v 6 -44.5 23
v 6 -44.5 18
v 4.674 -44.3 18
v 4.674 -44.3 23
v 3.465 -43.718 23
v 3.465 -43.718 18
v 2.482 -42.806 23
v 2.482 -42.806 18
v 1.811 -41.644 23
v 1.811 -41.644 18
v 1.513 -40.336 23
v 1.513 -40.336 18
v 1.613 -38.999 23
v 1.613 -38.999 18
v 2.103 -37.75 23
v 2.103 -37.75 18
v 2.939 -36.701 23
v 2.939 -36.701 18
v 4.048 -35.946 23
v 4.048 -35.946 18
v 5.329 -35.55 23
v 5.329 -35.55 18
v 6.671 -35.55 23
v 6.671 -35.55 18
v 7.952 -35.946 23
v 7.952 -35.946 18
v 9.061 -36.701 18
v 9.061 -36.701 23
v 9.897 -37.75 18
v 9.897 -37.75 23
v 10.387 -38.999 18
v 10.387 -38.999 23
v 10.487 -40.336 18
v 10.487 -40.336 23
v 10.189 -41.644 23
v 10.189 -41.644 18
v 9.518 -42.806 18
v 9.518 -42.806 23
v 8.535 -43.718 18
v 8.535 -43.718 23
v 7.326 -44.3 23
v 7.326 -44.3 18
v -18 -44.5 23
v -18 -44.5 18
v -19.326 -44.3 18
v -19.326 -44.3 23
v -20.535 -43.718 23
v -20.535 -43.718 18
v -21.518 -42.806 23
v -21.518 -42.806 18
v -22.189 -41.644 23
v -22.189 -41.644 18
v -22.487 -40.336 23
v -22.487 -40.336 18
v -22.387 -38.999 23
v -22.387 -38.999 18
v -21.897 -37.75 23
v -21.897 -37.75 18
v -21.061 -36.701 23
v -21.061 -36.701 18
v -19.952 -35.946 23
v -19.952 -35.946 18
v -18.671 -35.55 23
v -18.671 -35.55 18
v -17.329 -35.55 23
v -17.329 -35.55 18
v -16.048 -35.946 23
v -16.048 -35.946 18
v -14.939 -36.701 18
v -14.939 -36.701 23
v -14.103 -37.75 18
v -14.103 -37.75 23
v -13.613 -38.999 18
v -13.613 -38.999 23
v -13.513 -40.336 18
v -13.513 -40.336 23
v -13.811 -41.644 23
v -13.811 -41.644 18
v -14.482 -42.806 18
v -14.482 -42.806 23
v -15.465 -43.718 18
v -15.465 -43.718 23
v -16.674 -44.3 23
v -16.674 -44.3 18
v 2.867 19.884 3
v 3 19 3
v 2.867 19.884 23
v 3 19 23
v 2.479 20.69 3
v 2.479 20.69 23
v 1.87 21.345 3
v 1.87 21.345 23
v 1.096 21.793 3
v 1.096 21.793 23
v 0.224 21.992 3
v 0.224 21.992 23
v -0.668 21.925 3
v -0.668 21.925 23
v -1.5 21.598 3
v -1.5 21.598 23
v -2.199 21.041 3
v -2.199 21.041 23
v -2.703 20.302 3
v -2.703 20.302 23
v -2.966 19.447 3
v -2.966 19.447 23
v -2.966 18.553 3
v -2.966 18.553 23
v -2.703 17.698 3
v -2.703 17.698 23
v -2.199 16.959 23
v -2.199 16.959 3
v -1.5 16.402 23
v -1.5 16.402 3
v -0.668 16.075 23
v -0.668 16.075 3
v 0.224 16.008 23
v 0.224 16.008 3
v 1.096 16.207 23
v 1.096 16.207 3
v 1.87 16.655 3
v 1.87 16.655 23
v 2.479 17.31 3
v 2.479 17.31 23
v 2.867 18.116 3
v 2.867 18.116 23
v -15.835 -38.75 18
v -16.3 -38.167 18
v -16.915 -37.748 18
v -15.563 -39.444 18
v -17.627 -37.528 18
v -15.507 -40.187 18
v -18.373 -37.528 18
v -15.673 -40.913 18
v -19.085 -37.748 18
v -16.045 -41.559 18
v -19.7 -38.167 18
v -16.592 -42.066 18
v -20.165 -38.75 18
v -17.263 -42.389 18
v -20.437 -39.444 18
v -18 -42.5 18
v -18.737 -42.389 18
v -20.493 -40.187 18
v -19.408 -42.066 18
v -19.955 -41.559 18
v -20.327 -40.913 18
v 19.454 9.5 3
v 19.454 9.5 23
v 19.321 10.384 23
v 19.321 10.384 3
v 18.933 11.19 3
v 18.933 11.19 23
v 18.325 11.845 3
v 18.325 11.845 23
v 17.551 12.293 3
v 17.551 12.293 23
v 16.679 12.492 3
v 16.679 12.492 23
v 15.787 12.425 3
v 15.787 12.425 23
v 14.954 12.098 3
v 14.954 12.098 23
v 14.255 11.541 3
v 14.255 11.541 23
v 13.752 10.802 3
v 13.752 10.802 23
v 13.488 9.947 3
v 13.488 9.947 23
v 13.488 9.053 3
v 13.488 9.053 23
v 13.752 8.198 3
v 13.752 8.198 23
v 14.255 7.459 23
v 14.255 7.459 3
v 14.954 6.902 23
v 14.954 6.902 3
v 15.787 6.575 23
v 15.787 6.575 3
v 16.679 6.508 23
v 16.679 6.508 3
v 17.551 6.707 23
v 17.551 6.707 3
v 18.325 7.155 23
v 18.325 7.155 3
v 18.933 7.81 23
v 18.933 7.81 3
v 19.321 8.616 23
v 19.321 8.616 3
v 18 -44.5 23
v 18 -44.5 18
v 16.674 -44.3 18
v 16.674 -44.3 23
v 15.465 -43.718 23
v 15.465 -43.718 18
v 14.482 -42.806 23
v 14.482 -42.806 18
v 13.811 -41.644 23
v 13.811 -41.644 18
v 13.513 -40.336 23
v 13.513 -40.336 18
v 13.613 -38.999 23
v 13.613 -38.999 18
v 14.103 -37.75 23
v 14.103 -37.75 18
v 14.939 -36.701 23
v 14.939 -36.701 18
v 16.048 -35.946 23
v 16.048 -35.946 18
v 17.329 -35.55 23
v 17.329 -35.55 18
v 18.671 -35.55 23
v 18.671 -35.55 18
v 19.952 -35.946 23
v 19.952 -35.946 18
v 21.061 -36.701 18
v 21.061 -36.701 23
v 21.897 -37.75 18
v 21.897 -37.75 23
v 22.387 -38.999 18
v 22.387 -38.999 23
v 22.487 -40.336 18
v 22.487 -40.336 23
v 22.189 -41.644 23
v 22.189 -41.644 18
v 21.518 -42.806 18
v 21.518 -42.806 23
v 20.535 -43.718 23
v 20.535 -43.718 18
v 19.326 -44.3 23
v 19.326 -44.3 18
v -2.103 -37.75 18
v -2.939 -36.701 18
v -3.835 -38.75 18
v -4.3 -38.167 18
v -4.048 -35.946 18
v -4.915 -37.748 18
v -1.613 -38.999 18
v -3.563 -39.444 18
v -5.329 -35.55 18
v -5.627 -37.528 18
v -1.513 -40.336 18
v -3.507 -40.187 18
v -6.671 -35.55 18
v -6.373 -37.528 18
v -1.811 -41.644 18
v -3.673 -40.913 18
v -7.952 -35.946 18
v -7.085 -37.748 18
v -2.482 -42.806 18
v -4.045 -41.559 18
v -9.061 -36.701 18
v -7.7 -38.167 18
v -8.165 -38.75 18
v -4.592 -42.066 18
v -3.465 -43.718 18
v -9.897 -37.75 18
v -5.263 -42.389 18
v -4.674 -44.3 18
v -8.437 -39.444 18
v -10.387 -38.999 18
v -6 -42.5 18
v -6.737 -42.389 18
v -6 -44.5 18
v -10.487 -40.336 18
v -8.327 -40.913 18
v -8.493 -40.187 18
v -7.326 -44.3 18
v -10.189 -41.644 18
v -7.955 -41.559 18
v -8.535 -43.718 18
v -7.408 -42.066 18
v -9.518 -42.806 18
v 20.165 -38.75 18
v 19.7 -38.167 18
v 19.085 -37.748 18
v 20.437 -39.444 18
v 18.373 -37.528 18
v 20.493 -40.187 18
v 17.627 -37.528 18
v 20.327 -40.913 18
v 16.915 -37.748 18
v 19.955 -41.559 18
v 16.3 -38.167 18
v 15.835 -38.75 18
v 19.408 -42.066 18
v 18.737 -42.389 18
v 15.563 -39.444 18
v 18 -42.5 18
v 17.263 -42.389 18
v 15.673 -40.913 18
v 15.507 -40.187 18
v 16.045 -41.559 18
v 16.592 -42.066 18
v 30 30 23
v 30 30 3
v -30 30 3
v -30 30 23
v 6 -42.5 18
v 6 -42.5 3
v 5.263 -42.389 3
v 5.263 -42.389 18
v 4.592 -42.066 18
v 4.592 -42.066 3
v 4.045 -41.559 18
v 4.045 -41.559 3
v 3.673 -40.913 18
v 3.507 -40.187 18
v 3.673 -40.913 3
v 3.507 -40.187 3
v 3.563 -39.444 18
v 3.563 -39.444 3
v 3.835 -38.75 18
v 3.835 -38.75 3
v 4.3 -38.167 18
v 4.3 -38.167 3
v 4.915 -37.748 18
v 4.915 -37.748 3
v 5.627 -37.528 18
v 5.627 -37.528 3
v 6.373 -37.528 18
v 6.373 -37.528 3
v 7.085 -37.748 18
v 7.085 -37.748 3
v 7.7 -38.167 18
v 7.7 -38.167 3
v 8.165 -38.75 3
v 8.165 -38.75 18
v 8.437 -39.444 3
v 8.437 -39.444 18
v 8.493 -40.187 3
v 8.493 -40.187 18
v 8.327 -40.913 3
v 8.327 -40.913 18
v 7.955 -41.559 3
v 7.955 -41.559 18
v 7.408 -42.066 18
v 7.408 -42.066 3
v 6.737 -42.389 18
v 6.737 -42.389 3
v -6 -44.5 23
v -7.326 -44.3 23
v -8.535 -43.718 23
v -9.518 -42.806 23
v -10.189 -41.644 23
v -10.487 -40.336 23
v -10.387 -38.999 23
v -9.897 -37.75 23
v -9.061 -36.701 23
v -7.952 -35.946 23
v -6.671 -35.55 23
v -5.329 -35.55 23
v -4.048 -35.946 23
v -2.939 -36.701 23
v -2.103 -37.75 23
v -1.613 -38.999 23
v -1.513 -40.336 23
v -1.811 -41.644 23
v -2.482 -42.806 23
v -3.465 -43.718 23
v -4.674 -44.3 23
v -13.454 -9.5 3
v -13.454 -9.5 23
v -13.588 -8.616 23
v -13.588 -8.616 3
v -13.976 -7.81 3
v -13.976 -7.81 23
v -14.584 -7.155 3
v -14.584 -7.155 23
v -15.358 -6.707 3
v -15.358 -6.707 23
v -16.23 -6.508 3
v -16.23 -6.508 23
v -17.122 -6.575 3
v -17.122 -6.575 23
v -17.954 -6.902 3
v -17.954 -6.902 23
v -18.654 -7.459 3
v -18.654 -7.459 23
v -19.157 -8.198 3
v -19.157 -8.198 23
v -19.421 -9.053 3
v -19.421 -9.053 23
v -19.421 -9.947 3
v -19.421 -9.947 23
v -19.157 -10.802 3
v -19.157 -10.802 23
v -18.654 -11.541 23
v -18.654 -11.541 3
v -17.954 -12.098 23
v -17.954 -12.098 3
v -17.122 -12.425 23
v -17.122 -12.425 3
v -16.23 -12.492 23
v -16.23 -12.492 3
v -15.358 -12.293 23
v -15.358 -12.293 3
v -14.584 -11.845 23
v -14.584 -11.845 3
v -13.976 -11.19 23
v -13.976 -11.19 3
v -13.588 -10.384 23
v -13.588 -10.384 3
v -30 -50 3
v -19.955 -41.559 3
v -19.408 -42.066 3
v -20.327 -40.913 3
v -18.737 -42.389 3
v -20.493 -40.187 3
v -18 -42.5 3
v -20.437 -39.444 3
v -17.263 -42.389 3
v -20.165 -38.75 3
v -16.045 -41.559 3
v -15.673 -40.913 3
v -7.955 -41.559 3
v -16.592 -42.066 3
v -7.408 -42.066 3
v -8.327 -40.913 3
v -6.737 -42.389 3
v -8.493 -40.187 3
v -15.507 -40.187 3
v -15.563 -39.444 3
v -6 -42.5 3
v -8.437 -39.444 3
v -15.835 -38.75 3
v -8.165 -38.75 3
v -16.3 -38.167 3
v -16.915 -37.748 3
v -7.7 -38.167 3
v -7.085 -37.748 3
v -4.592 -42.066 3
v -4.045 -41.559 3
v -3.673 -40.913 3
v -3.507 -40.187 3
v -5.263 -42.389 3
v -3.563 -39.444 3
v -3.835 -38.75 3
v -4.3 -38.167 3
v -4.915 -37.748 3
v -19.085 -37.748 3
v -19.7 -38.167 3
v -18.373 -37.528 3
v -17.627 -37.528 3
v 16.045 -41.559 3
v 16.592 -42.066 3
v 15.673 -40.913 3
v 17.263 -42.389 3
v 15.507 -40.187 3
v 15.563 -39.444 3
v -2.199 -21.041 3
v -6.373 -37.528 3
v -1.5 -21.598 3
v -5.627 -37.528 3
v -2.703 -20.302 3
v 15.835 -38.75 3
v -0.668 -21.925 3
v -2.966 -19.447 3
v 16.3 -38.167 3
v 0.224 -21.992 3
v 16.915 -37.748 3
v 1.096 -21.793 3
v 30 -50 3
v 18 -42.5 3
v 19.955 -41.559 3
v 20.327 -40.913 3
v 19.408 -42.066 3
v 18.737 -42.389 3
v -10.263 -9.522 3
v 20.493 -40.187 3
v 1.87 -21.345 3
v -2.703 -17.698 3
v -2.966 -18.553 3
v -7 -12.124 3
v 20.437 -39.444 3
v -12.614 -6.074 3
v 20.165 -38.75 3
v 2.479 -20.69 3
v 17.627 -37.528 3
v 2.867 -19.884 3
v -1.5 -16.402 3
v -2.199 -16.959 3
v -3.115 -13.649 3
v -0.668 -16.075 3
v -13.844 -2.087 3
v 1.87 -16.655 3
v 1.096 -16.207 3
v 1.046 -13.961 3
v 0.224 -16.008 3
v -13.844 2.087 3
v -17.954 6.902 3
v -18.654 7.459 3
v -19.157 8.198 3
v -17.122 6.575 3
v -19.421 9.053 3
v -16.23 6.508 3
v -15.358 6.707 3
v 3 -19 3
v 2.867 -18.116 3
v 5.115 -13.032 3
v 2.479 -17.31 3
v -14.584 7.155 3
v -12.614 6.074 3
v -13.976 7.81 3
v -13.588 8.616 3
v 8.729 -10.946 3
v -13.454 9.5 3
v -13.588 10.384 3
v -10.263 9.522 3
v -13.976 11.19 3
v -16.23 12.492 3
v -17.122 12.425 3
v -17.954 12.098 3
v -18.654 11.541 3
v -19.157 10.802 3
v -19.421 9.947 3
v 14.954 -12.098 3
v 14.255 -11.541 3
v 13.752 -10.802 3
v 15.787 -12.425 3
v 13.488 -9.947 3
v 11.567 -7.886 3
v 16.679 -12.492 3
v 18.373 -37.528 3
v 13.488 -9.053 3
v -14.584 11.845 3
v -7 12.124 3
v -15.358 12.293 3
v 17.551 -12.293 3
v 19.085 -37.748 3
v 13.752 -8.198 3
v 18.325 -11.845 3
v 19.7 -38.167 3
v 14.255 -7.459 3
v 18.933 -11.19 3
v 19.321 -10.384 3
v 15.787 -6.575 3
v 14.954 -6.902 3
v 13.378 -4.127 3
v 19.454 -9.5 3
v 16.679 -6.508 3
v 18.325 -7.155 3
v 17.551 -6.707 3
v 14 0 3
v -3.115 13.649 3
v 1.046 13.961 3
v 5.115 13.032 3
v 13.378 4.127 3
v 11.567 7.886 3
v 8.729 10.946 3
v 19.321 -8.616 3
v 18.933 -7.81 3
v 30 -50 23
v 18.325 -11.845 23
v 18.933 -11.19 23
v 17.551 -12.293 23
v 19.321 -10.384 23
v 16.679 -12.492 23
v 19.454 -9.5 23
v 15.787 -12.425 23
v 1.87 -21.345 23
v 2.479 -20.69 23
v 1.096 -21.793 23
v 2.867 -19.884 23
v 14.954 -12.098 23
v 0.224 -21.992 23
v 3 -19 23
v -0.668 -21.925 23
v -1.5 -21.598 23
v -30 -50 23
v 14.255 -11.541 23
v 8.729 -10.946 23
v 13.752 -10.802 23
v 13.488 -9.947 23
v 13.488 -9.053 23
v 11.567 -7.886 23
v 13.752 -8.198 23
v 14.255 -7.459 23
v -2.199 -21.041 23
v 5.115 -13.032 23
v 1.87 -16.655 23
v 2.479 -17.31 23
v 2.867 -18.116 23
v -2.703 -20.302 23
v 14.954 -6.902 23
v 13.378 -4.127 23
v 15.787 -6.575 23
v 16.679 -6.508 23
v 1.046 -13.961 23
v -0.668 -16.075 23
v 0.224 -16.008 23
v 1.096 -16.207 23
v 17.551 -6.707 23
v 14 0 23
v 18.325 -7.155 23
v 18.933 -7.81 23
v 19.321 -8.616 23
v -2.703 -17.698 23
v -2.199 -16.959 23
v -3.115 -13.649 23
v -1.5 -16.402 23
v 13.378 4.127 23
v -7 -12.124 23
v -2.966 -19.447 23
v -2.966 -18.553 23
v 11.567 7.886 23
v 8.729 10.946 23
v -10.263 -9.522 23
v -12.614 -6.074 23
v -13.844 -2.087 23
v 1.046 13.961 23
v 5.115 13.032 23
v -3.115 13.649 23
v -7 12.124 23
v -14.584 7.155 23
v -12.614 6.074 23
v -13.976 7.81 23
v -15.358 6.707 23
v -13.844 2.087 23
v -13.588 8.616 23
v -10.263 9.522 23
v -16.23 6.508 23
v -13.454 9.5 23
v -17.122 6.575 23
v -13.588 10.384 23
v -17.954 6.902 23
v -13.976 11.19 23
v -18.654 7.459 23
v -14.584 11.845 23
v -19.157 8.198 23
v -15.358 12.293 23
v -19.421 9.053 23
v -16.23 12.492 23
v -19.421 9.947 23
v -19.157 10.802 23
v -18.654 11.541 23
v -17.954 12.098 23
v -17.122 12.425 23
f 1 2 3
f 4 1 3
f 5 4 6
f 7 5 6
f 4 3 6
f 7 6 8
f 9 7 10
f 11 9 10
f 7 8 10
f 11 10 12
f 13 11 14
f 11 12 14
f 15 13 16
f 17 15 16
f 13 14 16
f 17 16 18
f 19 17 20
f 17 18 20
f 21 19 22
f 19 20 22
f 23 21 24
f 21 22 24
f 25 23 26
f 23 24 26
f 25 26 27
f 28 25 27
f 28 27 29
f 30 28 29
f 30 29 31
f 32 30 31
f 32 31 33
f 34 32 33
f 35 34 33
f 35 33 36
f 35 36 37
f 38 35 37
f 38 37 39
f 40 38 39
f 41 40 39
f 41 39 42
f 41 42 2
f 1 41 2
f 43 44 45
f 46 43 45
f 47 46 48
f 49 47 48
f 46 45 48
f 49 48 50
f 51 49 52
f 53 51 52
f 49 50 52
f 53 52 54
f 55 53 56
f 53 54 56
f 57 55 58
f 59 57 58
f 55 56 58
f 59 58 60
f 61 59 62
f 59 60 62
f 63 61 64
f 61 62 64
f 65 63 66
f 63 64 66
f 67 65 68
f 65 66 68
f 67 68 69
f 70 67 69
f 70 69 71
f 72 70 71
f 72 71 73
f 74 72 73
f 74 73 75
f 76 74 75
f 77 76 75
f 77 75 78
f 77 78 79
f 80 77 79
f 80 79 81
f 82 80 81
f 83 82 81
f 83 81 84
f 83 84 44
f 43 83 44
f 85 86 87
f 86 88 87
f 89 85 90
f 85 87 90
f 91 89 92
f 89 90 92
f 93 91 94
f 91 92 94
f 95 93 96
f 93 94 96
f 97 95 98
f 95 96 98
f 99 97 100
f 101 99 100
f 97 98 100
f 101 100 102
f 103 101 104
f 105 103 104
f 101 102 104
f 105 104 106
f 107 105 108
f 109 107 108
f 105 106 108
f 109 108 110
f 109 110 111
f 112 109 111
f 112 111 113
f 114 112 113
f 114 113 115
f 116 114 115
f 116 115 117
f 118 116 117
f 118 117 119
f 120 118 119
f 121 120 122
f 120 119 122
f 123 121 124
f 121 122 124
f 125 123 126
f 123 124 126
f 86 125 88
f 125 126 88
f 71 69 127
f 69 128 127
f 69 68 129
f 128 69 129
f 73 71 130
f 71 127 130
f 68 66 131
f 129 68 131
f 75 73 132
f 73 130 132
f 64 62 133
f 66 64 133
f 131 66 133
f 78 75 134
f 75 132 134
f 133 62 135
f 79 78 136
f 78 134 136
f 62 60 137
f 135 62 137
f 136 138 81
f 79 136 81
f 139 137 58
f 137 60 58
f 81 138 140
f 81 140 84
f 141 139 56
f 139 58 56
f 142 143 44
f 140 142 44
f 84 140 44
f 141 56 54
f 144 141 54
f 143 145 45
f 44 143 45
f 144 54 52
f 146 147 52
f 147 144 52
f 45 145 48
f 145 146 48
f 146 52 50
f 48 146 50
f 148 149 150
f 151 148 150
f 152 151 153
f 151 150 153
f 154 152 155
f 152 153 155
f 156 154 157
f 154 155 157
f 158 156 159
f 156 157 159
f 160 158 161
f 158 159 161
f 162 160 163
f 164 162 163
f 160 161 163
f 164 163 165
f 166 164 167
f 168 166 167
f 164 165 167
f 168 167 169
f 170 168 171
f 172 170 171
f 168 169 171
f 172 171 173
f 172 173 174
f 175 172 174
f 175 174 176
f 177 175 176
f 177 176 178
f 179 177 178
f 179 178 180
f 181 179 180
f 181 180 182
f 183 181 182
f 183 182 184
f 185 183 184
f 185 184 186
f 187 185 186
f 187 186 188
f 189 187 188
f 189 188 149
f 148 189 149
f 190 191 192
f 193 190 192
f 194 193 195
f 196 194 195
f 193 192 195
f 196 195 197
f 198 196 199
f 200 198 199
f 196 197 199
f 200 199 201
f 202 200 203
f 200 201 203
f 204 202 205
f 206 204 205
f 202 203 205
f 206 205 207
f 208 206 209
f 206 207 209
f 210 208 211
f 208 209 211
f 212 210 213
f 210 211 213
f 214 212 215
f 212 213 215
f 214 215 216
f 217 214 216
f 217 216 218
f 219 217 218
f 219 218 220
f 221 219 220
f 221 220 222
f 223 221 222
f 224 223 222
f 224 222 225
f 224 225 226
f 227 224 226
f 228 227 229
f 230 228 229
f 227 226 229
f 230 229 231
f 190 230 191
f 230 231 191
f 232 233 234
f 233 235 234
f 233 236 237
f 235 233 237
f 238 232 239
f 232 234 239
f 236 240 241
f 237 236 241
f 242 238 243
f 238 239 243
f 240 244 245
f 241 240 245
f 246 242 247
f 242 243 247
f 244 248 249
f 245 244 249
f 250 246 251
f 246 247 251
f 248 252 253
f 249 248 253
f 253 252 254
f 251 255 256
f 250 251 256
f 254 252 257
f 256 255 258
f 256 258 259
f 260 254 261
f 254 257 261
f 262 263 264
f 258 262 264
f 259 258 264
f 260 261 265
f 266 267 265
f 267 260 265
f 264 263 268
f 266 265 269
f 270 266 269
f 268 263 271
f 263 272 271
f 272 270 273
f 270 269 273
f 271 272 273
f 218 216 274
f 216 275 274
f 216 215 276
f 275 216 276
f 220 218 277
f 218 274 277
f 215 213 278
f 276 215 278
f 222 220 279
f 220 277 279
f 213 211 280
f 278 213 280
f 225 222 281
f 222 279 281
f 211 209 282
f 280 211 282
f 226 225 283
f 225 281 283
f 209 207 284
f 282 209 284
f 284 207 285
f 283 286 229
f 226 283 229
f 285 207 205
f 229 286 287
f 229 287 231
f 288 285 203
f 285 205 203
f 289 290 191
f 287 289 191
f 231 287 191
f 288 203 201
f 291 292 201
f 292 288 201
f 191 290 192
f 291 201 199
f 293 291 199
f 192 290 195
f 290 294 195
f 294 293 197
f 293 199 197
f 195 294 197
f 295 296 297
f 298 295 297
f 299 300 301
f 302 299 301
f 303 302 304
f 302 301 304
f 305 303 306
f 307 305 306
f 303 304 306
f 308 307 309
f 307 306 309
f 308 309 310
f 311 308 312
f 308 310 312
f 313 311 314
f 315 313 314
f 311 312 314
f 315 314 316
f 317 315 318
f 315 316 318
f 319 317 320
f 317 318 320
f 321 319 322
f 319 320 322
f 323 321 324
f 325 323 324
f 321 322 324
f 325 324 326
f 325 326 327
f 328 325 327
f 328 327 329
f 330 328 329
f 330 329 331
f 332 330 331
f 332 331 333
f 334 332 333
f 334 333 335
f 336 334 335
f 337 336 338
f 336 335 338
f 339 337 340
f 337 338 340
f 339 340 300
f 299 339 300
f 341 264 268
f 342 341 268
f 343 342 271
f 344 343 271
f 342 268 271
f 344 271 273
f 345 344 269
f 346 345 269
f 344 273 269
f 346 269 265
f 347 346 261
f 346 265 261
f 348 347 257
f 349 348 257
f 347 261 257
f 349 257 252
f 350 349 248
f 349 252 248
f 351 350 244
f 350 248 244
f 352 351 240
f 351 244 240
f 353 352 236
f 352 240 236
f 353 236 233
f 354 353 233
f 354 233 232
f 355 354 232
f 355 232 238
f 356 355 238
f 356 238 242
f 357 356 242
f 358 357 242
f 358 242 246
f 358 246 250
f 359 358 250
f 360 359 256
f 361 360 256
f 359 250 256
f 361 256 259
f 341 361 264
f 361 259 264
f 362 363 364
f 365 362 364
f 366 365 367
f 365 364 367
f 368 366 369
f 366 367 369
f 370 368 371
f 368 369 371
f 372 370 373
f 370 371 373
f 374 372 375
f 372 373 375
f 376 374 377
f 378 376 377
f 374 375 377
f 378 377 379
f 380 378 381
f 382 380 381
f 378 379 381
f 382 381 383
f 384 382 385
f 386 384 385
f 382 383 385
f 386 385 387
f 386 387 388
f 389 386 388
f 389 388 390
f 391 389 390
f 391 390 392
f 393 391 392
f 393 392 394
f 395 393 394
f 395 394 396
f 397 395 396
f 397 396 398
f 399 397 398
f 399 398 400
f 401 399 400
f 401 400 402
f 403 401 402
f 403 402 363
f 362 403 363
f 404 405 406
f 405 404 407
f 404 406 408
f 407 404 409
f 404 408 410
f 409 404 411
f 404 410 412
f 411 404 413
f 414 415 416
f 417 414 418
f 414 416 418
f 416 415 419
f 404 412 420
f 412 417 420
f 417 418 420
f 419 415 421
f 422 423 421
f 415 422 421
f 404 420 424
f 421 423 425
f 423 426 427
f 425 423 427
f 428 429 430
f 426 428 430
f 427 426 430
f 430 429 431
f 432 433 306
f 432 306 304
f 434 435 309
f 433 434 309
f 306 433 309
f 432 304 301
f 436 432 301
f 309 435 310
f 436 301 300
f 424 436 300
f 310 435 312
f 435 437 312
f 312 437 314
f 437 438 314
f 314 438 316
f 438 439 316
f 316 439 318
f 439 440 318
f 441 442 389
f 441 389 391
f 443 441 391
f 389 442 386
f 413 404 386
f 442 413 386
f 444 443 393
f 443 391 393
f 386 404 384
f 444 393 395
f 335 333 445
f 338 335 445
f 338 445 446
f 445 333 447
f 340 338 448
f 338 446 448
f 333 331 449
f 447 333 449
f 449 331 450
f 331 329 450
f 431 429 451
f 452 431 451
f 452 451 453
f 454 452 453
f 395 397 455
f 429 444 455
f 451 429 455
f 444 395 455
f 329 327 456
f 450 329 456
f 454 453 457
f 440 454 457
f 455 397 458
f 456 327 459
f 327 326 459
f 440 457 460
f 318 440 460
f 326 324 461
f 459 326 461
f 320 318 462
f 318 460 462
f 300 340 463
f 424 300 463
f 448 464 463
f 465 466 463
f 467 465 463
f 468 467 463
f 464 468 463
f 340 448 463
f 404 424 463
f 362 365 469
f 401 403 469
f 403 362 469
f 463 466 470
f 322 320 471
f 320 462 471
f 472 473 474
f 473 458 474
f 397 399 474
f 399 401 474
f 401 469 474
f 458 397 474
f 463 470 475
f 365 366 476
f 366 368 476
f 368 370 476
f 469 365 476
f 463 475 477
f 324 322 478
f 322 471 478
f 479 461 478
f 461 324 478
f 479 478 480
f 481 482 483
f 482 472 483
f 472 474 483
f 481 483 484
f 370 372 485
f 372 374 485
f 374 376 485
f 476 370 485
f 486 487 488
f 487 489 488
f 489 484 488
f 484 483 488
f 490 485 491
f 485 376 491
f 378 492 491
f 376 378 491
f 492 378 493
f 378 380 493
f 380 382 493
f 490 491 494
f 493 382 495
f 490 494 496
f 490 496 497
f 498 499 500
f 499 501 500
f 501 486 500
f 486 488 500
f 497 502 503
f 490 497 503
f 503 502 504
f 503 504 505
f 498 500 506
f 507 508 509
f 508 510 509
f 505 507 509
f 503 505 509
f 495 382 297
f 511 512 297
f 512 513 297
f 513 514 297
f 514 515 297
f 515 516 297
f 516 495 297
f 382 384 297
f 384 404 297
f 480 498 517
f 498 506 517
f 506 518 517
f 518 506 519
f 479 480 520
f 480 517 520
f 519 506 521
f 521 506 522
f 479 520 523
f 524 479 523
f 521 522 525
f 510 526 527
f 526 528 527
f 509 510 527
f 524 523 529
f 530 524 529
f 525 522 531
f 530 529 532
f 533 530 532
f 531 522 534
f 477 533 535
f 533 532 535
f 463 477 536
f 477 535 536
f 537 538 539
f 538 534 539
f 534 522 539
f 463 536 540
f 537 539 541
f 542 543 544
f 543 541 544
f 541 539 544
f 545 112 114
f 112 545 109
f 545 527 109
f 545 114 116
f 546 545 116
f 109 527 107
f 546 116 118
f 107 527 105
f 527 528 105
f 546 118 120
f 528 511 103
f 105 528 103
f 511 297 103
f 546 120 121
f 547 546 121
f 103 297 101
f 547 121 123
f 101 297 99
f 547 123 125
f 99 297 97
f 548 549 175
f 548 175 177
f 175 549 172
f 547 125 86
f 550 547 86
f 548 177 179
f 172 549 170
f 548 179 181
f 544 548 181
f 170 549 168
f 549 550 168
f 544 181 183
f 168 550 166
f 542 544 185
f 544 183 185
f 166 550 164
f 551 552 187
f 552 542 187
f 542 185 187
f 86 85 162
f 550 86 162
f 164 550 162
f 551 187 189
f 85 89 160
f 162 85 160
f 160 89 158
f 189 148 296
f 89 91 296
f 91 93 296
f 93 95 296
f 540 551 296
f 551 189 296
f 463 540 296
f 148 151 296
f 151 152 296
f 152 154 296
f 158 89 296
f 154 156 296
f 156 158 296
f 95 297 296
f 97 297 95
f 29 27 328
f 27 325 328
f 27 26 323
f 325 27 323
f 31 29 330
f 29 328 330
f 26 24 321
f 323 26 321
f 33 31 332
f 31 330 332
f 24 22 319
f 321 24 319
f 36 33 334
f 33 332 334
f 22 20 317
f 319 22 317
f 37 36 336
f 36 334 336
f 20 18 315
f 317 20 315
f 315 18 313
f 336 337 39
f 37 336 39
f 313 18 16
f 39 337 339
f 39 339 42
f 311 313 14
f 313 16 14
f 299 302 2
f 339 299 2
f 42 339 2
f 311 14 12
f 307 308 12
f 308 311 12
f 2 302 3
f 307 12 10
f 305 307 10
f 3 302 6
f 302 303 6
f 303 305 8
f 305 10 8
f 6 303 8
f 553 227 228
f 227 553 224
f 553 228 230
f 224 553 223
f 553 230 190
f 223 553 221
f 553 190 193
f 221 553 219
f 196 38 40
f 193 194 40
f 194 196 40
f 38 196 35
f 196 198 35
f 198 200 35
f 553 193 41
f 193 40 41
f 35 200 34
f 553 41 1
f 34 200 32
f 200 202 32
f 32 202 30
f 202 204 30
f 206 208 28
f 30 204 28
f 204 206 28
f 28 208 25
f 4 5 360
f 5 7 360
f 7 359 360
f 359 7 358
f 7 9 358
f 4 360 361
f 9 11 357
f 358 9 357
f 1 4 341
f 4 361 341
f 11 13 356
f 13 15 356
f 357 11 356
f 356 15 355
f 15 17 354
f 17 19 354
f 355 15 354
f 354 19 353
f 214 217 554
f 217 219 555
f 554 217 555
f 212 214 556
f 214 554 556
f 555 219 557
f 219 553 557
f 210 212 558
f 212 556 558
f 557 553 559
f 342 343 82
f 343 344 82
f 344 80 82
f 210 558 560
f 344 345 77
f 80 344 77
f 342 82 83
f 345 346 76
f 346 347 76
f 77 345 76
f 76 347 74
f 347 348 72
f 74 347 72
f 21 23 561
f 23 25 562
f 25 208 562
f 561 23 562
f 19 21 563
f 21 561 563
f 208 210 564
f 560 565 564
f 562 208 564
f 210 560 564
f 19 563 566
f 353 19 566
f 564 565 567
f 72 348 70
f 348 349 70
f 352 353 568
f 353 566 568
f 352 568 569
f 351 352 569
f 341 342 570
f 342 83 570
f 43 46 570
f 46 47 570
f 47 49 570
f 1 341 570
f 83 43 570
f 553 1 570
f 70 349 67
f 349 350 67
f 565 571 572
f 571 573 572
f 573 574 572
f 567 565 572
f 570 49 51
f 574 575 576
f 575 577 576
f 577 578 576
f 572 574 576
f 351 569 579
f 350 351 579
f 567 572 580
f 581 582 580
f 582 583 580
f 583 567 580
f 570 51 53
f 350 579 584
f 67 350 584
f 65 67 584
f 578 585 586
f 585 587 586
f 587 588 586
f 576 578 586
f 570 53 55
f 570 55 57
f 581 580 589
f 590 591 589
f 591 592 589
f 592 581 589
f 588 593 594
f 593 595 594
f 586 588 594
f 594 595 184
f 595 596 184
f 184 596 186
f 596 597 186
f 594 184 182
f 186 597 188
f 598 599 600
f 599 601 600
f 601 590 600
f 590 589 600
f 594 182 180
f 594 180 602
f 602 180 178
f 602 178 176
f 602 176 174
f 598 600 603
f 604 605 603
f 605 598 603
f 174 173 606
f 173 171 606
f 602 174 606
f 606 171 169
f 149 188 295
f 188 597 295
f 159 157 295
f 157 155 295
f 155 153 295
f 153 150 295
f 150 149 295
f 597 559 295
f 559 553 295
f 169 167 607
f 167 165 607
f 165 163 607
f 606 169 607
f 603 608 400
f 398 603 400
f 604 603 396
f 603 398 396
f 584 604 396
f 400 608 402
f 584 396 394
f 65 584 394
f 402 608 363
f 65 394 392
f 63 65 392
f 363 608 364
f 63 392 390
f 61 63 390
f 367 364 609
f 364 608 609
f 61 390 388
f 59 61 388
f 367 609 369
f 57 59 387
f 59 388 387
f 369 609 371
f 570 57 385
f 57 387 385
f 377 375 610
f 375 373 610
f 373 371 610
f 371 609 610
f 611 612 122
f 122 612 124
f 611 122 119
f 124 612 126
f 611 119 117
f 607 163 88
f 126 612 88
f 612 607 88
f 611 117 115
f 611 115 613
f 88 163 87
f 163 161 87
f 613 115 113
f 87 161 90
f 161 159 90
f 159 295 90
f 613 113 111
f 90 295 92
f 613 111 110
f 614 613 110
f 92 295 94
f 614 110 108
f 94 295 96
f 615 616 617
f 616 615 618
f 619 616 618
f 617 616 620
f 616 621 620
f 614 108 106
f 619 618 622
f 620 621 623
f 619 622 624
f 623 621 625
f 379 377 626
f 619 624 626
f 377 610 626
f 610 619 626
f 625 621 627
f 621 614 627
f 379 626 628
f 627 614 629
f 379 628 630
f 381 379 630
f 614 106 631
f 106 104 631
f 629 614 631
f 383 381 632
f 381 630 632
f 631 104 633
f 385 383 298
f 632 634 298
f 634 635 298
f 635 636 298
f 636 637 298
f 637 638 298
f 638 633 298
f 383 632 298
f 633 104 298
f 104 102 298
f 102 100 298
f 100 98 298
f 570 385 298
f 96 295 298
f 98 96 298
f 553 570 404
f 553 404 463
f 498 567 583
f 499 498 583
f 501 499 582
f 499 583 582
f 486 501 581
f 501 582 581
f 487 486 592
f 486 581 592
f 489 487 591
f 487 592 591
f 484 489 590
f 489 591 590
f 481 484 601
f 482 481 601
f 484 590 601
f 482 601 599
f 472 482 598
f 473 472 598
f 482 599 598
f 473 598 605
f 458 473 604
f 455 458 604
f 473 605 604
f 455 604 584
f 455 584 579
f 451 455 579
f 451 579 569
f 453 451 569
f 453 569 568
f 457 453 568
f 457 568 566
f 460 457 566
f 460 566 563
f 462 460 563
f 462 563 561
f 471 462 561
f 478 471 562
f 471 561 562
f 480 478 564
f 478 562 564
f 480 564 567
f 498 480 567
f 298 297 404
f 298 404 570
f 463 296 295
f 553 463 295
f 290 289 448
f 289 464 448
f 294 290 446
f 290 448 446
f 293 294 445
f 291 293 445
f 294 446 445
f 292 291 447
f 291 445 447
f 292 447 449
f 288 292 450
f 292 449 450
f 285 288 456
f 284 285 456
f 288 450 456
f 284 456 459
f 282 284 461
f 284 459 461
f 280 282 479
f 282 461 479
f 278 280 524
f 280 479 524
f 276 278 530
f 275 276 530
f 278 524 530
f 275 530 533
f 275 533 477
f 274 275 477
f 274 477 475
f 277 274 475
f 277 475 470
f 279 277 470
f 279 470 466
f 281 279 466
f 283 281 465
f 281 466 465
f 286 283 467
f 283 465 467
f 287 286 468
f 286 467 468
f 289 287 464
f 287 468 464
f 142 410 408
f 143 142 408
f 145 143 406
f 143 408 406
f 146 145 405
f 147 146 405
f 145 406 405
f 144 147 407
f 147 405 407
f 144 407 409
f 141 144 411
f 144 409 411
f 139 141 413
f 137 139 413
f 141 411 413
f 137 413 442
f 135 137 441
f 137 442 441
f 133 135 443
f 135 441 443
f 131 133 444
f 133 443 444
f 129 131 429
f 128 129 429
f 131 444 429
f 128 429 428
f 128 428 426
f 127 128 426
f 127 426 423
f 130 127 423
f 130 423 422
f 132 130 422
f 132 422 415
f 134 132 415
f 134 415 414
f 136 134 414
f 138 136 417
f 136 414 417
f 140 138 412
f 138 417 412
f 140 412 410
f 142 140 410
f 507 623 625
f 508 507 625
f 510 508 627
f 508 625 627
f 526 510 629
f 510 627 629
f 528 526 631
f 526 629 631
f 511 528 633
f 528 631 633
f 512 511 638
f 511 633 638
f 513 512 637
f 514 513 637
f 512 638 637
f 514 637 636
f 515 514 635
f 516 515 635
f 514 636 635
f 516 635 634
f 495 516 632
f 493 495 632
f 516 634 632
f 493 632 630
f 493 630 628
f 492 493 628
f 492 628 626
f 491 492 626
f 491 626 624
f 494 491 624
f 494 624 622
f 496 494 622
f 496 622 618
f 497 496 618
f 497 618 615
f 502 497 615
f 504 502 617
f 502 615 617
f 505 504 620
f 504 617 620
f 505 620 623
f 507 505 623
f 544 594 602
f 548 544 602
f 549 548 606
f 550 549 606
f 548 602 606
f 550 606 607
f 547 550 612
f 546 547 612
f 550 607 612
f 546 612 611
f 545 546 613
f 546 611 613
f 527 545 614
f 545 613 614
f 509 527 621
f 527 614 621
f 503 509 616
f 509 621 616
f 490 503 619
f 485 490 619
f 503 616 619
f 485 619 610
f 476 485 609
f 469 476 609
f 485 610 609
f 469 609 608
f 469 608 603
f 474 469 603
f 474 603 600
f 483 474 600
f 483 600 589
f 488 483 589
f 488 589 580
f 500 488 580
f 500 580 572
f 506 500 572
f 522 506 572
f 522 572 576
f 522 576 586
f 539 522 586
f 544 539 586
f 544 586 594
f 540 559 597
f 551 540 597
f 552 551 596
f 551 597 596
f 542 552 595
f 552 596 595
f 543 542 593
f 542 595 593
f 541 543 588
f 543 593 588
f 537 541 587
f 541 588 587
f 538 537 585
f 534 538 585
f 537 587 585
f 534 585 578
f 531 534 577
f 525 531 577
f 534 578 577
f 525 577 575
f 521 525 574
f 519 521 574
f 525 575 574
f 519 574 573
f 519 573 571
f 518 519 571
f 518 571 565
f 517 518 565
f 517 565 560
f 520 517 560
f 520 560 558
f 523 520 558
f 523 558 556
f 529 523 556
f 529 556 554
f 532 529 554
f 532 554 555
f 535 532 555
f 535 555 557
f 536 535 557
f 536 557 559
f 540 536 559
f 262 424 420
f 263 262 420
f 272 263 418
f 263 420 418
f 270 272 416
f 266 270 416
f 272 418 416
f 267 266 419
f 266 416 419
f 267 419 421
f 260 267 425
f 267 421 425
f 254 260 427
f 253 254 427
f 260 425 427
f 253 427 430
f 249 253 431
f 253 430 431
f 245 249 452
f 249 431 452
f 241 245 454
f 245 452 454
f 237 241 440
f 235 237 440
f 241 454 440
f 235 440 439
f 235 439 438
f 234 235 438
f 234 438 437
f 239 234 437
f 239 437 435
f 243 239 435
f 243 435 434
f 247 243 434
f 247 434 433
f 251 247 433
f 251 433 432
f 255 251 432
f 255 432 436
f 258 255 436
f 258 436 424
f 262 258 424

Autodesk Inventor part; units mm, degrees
ref_plane "YZ Plane" through (0, 0, 0) normal (1, 0, 0) x (0, 1, 0)
ref_plane "XZ Plane" through (0, 0, 0) normal (0, 1, 0) x (-1, 0, 0)
ref_plane "XY Plane" through (0, 0, 0) normal (0, 0, 1) x (1, 0, 0)
sketch "Szkic1" plane through (0, 0, 0) normal (0, 0, 1) x (1, 0, 0)
  line L0 (-30, -30) -> (30, -30)
  line L1 (30, -30) -> (30, 30)
  line L2 (30, 30) -> (-30, 30)
  line L3 (-30, 30) -> (-30, -30)
  line L4 (-30, -30) -> (30, 30) construction
  line L5 (30, -30) -> (-30, 30) construction
  point P0 (0, 0)
  dimension "d0" = 60
  dimension "d1" = 60
extrude "Wyciągnięcie proste1" add sketch "Szkic1" along normal blind 35
sketch "Szkic2" plane through (0, 0, 35) normal (0, 0, 1) x (1, 0, 0)
  circle A0 centre (0, 0) radius 25
  dimension "d4" = 50
extrude "Wyciągnięcie proste2" cut sketch "Szkic2" against normal blind 12
sketch "Szkic3" plane through (0, 0, 23) normal (0, 0, 1) x (1, 0, 0)
  circle A0 centre (0, 0) radius 14
  dimension "d7" = 28
extrude "Wyciągnięcie proste3" cut sketch "Szkic3" against normal up to next
sketch "Szkic4" plane through (0, 0, 23) normal (0, 0, 1) x (1, 0, 0)
  circle A0 centre (0, 0) radius 19
  circle A1 centre (0, 19) radius 3
  circle A2 centre (-16.4545, 9.5) radius 3
  circle A3 centre (-16.4545, -9.5) radius 3
  circle A4 centre (0, -19) radius 3
  circle A5 centre (16.4545, -9.5) radius 3
  circle A6 centre (16.4545, 9.5) radius 3
  dimension "d10" = 38
  dimension "d11" = 6
  dimension "d14" = 360
sketch "Szkic13" plane through (0, 0, 35) normal (0, 0, 1) x (1, 0, 0)
  circle A0 centre (0, 0) radius 25 projected
  line L0 (-30, -30) -> (30, -30) projected
  line L1 (30, -30) -> (30, 30) projected
  line L2 (30, 30) -> (-30, 30) projected
  line L3 (-30, 30) -> (-30, -30) projected
extrude "Wyciągnięcie proste10" cut sketch "Szkic13" against normal up to surface (12 mm away)
extrude "Wyciągnięcie proste11" cut sketch "Szkic4" against normal up to next contours A6 A0 | A0 A6 | A5 A0 | A0 A5 | A1 A0 | A0 A1 | A4 A0 | A0 A4 | A2 A0 | A0 A2 | A3 A0 | A0 A3
thread "Gwint7" size "M6x1" class "6H" standard "ANSI Metric M Profile" full length
thread "Gwint8" size "M6x1" class "6H" standard "ANSI Metric M Profile" full length
thread "Gwint9" size "M6x1" class "6H" standard "ANSI Metric M Profile" full length
thread "Gwint10" size "M6x1" class "6H" standard "ANSI Metric M Profile" full length
thread "Gwint11" size "M6x1" class "6H" standard "ANSI Metric M Profile" full length
thread "Gwint12" size "M6x1" class "6H" standard "ANSI Metric M Profile" full length
sketch "Szkic14" plane through (0, 0, 0) normal (0, 0, -1) x (-1, 0, 0)
  circle A0 centre (0, 0) radius 14 projected
  line L0 (30, -30) -> (-30, -30) projected
  line L1 (30, 30) -> (30, -30) projected
  line L2 (-30, 30) -> (30, 30) projected
  line L3 (-30, -30) -> (-30, 30) projected
extrude "Wyciągnięcie proste12" cut sketch "Szkic14" against normal blind 3
sketch "Szkic16" plane through (-30, -30, 23) normal (0, -1, 0) x (1, 0, 0)
  line L0 (0, -20) -> (60, -20) projected
  line L1 (60, -20) -> (60, 0) projected
  line L2 (60, 0) -> (0, 0) projected
  line L3 (0, -20) -> (0, 0) projected
  point P0 (30, -23)
extrude "Wyciągnięcie proste14" add sketch "Szkic16" along normal blind 20
sketch "Szkic17" plane through (0, 0, 23) normal (0, 0, 1) x (1, 0, 0)
  circle A0 centre (16.4545, 9.5) radius 3 projected
  circle A1 centre (0, -19) radius 3 projected
  circle A2 centre (-16.4545, 9.5) radius 3 projected
  circle A3 centre (0, 19) radius 3 projected
  circle A4 centre (-16.4545, -9.5) radius 3 projected
  circle A5 centre (16.4545, -9.5) radius 3 projected
  line L0 (30, 30) -> (30, -50) projected
  line L1 (-30, 30) -> (30, 30) projected
  line L2 (-30, -50) -> (-30, 30) projected
  line L3 (30, -50) -> (-30, -50) projected
  circle A6 centre (0, 0) radius 14 projected
  line L4 (-30, -50) -> (-30, -40)
  line L5 (-30, 30) -> (-30, -50) projected
  line L6 (-30, -40) -> (30, -40)
  line L7 (30, -50) -> (30, 30) projected
  line L8 (-30, -40) -> (-18, -40)
  line L9 (-18, -40) -> (-6, -40)
  line L10 (-6, -40) -> (6, -40)
  line L11 (6, -40) -> (18, -40)
  circle A7 centre (-18, -40) radius 2.5
  circle A8 centre (-6, -40) radius 2.5
  circle A9 centre (6, -40) radius 2.5
  circle A10 centre (18, -40) radius 2.5
  dimension "d100" = 10
  dimension "d101" = 12
  dimension "d102" = 12
  dimension "d103" = 12
  dimension "d104" = 12
  dimension "d105" = 5
  dimension "d106" = 5
  dimension "d107" = 5
  dimension "d108" = 5
hole "Otwór1" at (-18, -40, 23) at (-6, -40, 23) at (6, -40, 23) at (18, -40, 23) direction (0, 0, -1) diameter 5 end through all counterbore diameter 9 counterbore depth 5
properties part number "Obudowa nakrętki trapezowej fi 16 - oś Y"
